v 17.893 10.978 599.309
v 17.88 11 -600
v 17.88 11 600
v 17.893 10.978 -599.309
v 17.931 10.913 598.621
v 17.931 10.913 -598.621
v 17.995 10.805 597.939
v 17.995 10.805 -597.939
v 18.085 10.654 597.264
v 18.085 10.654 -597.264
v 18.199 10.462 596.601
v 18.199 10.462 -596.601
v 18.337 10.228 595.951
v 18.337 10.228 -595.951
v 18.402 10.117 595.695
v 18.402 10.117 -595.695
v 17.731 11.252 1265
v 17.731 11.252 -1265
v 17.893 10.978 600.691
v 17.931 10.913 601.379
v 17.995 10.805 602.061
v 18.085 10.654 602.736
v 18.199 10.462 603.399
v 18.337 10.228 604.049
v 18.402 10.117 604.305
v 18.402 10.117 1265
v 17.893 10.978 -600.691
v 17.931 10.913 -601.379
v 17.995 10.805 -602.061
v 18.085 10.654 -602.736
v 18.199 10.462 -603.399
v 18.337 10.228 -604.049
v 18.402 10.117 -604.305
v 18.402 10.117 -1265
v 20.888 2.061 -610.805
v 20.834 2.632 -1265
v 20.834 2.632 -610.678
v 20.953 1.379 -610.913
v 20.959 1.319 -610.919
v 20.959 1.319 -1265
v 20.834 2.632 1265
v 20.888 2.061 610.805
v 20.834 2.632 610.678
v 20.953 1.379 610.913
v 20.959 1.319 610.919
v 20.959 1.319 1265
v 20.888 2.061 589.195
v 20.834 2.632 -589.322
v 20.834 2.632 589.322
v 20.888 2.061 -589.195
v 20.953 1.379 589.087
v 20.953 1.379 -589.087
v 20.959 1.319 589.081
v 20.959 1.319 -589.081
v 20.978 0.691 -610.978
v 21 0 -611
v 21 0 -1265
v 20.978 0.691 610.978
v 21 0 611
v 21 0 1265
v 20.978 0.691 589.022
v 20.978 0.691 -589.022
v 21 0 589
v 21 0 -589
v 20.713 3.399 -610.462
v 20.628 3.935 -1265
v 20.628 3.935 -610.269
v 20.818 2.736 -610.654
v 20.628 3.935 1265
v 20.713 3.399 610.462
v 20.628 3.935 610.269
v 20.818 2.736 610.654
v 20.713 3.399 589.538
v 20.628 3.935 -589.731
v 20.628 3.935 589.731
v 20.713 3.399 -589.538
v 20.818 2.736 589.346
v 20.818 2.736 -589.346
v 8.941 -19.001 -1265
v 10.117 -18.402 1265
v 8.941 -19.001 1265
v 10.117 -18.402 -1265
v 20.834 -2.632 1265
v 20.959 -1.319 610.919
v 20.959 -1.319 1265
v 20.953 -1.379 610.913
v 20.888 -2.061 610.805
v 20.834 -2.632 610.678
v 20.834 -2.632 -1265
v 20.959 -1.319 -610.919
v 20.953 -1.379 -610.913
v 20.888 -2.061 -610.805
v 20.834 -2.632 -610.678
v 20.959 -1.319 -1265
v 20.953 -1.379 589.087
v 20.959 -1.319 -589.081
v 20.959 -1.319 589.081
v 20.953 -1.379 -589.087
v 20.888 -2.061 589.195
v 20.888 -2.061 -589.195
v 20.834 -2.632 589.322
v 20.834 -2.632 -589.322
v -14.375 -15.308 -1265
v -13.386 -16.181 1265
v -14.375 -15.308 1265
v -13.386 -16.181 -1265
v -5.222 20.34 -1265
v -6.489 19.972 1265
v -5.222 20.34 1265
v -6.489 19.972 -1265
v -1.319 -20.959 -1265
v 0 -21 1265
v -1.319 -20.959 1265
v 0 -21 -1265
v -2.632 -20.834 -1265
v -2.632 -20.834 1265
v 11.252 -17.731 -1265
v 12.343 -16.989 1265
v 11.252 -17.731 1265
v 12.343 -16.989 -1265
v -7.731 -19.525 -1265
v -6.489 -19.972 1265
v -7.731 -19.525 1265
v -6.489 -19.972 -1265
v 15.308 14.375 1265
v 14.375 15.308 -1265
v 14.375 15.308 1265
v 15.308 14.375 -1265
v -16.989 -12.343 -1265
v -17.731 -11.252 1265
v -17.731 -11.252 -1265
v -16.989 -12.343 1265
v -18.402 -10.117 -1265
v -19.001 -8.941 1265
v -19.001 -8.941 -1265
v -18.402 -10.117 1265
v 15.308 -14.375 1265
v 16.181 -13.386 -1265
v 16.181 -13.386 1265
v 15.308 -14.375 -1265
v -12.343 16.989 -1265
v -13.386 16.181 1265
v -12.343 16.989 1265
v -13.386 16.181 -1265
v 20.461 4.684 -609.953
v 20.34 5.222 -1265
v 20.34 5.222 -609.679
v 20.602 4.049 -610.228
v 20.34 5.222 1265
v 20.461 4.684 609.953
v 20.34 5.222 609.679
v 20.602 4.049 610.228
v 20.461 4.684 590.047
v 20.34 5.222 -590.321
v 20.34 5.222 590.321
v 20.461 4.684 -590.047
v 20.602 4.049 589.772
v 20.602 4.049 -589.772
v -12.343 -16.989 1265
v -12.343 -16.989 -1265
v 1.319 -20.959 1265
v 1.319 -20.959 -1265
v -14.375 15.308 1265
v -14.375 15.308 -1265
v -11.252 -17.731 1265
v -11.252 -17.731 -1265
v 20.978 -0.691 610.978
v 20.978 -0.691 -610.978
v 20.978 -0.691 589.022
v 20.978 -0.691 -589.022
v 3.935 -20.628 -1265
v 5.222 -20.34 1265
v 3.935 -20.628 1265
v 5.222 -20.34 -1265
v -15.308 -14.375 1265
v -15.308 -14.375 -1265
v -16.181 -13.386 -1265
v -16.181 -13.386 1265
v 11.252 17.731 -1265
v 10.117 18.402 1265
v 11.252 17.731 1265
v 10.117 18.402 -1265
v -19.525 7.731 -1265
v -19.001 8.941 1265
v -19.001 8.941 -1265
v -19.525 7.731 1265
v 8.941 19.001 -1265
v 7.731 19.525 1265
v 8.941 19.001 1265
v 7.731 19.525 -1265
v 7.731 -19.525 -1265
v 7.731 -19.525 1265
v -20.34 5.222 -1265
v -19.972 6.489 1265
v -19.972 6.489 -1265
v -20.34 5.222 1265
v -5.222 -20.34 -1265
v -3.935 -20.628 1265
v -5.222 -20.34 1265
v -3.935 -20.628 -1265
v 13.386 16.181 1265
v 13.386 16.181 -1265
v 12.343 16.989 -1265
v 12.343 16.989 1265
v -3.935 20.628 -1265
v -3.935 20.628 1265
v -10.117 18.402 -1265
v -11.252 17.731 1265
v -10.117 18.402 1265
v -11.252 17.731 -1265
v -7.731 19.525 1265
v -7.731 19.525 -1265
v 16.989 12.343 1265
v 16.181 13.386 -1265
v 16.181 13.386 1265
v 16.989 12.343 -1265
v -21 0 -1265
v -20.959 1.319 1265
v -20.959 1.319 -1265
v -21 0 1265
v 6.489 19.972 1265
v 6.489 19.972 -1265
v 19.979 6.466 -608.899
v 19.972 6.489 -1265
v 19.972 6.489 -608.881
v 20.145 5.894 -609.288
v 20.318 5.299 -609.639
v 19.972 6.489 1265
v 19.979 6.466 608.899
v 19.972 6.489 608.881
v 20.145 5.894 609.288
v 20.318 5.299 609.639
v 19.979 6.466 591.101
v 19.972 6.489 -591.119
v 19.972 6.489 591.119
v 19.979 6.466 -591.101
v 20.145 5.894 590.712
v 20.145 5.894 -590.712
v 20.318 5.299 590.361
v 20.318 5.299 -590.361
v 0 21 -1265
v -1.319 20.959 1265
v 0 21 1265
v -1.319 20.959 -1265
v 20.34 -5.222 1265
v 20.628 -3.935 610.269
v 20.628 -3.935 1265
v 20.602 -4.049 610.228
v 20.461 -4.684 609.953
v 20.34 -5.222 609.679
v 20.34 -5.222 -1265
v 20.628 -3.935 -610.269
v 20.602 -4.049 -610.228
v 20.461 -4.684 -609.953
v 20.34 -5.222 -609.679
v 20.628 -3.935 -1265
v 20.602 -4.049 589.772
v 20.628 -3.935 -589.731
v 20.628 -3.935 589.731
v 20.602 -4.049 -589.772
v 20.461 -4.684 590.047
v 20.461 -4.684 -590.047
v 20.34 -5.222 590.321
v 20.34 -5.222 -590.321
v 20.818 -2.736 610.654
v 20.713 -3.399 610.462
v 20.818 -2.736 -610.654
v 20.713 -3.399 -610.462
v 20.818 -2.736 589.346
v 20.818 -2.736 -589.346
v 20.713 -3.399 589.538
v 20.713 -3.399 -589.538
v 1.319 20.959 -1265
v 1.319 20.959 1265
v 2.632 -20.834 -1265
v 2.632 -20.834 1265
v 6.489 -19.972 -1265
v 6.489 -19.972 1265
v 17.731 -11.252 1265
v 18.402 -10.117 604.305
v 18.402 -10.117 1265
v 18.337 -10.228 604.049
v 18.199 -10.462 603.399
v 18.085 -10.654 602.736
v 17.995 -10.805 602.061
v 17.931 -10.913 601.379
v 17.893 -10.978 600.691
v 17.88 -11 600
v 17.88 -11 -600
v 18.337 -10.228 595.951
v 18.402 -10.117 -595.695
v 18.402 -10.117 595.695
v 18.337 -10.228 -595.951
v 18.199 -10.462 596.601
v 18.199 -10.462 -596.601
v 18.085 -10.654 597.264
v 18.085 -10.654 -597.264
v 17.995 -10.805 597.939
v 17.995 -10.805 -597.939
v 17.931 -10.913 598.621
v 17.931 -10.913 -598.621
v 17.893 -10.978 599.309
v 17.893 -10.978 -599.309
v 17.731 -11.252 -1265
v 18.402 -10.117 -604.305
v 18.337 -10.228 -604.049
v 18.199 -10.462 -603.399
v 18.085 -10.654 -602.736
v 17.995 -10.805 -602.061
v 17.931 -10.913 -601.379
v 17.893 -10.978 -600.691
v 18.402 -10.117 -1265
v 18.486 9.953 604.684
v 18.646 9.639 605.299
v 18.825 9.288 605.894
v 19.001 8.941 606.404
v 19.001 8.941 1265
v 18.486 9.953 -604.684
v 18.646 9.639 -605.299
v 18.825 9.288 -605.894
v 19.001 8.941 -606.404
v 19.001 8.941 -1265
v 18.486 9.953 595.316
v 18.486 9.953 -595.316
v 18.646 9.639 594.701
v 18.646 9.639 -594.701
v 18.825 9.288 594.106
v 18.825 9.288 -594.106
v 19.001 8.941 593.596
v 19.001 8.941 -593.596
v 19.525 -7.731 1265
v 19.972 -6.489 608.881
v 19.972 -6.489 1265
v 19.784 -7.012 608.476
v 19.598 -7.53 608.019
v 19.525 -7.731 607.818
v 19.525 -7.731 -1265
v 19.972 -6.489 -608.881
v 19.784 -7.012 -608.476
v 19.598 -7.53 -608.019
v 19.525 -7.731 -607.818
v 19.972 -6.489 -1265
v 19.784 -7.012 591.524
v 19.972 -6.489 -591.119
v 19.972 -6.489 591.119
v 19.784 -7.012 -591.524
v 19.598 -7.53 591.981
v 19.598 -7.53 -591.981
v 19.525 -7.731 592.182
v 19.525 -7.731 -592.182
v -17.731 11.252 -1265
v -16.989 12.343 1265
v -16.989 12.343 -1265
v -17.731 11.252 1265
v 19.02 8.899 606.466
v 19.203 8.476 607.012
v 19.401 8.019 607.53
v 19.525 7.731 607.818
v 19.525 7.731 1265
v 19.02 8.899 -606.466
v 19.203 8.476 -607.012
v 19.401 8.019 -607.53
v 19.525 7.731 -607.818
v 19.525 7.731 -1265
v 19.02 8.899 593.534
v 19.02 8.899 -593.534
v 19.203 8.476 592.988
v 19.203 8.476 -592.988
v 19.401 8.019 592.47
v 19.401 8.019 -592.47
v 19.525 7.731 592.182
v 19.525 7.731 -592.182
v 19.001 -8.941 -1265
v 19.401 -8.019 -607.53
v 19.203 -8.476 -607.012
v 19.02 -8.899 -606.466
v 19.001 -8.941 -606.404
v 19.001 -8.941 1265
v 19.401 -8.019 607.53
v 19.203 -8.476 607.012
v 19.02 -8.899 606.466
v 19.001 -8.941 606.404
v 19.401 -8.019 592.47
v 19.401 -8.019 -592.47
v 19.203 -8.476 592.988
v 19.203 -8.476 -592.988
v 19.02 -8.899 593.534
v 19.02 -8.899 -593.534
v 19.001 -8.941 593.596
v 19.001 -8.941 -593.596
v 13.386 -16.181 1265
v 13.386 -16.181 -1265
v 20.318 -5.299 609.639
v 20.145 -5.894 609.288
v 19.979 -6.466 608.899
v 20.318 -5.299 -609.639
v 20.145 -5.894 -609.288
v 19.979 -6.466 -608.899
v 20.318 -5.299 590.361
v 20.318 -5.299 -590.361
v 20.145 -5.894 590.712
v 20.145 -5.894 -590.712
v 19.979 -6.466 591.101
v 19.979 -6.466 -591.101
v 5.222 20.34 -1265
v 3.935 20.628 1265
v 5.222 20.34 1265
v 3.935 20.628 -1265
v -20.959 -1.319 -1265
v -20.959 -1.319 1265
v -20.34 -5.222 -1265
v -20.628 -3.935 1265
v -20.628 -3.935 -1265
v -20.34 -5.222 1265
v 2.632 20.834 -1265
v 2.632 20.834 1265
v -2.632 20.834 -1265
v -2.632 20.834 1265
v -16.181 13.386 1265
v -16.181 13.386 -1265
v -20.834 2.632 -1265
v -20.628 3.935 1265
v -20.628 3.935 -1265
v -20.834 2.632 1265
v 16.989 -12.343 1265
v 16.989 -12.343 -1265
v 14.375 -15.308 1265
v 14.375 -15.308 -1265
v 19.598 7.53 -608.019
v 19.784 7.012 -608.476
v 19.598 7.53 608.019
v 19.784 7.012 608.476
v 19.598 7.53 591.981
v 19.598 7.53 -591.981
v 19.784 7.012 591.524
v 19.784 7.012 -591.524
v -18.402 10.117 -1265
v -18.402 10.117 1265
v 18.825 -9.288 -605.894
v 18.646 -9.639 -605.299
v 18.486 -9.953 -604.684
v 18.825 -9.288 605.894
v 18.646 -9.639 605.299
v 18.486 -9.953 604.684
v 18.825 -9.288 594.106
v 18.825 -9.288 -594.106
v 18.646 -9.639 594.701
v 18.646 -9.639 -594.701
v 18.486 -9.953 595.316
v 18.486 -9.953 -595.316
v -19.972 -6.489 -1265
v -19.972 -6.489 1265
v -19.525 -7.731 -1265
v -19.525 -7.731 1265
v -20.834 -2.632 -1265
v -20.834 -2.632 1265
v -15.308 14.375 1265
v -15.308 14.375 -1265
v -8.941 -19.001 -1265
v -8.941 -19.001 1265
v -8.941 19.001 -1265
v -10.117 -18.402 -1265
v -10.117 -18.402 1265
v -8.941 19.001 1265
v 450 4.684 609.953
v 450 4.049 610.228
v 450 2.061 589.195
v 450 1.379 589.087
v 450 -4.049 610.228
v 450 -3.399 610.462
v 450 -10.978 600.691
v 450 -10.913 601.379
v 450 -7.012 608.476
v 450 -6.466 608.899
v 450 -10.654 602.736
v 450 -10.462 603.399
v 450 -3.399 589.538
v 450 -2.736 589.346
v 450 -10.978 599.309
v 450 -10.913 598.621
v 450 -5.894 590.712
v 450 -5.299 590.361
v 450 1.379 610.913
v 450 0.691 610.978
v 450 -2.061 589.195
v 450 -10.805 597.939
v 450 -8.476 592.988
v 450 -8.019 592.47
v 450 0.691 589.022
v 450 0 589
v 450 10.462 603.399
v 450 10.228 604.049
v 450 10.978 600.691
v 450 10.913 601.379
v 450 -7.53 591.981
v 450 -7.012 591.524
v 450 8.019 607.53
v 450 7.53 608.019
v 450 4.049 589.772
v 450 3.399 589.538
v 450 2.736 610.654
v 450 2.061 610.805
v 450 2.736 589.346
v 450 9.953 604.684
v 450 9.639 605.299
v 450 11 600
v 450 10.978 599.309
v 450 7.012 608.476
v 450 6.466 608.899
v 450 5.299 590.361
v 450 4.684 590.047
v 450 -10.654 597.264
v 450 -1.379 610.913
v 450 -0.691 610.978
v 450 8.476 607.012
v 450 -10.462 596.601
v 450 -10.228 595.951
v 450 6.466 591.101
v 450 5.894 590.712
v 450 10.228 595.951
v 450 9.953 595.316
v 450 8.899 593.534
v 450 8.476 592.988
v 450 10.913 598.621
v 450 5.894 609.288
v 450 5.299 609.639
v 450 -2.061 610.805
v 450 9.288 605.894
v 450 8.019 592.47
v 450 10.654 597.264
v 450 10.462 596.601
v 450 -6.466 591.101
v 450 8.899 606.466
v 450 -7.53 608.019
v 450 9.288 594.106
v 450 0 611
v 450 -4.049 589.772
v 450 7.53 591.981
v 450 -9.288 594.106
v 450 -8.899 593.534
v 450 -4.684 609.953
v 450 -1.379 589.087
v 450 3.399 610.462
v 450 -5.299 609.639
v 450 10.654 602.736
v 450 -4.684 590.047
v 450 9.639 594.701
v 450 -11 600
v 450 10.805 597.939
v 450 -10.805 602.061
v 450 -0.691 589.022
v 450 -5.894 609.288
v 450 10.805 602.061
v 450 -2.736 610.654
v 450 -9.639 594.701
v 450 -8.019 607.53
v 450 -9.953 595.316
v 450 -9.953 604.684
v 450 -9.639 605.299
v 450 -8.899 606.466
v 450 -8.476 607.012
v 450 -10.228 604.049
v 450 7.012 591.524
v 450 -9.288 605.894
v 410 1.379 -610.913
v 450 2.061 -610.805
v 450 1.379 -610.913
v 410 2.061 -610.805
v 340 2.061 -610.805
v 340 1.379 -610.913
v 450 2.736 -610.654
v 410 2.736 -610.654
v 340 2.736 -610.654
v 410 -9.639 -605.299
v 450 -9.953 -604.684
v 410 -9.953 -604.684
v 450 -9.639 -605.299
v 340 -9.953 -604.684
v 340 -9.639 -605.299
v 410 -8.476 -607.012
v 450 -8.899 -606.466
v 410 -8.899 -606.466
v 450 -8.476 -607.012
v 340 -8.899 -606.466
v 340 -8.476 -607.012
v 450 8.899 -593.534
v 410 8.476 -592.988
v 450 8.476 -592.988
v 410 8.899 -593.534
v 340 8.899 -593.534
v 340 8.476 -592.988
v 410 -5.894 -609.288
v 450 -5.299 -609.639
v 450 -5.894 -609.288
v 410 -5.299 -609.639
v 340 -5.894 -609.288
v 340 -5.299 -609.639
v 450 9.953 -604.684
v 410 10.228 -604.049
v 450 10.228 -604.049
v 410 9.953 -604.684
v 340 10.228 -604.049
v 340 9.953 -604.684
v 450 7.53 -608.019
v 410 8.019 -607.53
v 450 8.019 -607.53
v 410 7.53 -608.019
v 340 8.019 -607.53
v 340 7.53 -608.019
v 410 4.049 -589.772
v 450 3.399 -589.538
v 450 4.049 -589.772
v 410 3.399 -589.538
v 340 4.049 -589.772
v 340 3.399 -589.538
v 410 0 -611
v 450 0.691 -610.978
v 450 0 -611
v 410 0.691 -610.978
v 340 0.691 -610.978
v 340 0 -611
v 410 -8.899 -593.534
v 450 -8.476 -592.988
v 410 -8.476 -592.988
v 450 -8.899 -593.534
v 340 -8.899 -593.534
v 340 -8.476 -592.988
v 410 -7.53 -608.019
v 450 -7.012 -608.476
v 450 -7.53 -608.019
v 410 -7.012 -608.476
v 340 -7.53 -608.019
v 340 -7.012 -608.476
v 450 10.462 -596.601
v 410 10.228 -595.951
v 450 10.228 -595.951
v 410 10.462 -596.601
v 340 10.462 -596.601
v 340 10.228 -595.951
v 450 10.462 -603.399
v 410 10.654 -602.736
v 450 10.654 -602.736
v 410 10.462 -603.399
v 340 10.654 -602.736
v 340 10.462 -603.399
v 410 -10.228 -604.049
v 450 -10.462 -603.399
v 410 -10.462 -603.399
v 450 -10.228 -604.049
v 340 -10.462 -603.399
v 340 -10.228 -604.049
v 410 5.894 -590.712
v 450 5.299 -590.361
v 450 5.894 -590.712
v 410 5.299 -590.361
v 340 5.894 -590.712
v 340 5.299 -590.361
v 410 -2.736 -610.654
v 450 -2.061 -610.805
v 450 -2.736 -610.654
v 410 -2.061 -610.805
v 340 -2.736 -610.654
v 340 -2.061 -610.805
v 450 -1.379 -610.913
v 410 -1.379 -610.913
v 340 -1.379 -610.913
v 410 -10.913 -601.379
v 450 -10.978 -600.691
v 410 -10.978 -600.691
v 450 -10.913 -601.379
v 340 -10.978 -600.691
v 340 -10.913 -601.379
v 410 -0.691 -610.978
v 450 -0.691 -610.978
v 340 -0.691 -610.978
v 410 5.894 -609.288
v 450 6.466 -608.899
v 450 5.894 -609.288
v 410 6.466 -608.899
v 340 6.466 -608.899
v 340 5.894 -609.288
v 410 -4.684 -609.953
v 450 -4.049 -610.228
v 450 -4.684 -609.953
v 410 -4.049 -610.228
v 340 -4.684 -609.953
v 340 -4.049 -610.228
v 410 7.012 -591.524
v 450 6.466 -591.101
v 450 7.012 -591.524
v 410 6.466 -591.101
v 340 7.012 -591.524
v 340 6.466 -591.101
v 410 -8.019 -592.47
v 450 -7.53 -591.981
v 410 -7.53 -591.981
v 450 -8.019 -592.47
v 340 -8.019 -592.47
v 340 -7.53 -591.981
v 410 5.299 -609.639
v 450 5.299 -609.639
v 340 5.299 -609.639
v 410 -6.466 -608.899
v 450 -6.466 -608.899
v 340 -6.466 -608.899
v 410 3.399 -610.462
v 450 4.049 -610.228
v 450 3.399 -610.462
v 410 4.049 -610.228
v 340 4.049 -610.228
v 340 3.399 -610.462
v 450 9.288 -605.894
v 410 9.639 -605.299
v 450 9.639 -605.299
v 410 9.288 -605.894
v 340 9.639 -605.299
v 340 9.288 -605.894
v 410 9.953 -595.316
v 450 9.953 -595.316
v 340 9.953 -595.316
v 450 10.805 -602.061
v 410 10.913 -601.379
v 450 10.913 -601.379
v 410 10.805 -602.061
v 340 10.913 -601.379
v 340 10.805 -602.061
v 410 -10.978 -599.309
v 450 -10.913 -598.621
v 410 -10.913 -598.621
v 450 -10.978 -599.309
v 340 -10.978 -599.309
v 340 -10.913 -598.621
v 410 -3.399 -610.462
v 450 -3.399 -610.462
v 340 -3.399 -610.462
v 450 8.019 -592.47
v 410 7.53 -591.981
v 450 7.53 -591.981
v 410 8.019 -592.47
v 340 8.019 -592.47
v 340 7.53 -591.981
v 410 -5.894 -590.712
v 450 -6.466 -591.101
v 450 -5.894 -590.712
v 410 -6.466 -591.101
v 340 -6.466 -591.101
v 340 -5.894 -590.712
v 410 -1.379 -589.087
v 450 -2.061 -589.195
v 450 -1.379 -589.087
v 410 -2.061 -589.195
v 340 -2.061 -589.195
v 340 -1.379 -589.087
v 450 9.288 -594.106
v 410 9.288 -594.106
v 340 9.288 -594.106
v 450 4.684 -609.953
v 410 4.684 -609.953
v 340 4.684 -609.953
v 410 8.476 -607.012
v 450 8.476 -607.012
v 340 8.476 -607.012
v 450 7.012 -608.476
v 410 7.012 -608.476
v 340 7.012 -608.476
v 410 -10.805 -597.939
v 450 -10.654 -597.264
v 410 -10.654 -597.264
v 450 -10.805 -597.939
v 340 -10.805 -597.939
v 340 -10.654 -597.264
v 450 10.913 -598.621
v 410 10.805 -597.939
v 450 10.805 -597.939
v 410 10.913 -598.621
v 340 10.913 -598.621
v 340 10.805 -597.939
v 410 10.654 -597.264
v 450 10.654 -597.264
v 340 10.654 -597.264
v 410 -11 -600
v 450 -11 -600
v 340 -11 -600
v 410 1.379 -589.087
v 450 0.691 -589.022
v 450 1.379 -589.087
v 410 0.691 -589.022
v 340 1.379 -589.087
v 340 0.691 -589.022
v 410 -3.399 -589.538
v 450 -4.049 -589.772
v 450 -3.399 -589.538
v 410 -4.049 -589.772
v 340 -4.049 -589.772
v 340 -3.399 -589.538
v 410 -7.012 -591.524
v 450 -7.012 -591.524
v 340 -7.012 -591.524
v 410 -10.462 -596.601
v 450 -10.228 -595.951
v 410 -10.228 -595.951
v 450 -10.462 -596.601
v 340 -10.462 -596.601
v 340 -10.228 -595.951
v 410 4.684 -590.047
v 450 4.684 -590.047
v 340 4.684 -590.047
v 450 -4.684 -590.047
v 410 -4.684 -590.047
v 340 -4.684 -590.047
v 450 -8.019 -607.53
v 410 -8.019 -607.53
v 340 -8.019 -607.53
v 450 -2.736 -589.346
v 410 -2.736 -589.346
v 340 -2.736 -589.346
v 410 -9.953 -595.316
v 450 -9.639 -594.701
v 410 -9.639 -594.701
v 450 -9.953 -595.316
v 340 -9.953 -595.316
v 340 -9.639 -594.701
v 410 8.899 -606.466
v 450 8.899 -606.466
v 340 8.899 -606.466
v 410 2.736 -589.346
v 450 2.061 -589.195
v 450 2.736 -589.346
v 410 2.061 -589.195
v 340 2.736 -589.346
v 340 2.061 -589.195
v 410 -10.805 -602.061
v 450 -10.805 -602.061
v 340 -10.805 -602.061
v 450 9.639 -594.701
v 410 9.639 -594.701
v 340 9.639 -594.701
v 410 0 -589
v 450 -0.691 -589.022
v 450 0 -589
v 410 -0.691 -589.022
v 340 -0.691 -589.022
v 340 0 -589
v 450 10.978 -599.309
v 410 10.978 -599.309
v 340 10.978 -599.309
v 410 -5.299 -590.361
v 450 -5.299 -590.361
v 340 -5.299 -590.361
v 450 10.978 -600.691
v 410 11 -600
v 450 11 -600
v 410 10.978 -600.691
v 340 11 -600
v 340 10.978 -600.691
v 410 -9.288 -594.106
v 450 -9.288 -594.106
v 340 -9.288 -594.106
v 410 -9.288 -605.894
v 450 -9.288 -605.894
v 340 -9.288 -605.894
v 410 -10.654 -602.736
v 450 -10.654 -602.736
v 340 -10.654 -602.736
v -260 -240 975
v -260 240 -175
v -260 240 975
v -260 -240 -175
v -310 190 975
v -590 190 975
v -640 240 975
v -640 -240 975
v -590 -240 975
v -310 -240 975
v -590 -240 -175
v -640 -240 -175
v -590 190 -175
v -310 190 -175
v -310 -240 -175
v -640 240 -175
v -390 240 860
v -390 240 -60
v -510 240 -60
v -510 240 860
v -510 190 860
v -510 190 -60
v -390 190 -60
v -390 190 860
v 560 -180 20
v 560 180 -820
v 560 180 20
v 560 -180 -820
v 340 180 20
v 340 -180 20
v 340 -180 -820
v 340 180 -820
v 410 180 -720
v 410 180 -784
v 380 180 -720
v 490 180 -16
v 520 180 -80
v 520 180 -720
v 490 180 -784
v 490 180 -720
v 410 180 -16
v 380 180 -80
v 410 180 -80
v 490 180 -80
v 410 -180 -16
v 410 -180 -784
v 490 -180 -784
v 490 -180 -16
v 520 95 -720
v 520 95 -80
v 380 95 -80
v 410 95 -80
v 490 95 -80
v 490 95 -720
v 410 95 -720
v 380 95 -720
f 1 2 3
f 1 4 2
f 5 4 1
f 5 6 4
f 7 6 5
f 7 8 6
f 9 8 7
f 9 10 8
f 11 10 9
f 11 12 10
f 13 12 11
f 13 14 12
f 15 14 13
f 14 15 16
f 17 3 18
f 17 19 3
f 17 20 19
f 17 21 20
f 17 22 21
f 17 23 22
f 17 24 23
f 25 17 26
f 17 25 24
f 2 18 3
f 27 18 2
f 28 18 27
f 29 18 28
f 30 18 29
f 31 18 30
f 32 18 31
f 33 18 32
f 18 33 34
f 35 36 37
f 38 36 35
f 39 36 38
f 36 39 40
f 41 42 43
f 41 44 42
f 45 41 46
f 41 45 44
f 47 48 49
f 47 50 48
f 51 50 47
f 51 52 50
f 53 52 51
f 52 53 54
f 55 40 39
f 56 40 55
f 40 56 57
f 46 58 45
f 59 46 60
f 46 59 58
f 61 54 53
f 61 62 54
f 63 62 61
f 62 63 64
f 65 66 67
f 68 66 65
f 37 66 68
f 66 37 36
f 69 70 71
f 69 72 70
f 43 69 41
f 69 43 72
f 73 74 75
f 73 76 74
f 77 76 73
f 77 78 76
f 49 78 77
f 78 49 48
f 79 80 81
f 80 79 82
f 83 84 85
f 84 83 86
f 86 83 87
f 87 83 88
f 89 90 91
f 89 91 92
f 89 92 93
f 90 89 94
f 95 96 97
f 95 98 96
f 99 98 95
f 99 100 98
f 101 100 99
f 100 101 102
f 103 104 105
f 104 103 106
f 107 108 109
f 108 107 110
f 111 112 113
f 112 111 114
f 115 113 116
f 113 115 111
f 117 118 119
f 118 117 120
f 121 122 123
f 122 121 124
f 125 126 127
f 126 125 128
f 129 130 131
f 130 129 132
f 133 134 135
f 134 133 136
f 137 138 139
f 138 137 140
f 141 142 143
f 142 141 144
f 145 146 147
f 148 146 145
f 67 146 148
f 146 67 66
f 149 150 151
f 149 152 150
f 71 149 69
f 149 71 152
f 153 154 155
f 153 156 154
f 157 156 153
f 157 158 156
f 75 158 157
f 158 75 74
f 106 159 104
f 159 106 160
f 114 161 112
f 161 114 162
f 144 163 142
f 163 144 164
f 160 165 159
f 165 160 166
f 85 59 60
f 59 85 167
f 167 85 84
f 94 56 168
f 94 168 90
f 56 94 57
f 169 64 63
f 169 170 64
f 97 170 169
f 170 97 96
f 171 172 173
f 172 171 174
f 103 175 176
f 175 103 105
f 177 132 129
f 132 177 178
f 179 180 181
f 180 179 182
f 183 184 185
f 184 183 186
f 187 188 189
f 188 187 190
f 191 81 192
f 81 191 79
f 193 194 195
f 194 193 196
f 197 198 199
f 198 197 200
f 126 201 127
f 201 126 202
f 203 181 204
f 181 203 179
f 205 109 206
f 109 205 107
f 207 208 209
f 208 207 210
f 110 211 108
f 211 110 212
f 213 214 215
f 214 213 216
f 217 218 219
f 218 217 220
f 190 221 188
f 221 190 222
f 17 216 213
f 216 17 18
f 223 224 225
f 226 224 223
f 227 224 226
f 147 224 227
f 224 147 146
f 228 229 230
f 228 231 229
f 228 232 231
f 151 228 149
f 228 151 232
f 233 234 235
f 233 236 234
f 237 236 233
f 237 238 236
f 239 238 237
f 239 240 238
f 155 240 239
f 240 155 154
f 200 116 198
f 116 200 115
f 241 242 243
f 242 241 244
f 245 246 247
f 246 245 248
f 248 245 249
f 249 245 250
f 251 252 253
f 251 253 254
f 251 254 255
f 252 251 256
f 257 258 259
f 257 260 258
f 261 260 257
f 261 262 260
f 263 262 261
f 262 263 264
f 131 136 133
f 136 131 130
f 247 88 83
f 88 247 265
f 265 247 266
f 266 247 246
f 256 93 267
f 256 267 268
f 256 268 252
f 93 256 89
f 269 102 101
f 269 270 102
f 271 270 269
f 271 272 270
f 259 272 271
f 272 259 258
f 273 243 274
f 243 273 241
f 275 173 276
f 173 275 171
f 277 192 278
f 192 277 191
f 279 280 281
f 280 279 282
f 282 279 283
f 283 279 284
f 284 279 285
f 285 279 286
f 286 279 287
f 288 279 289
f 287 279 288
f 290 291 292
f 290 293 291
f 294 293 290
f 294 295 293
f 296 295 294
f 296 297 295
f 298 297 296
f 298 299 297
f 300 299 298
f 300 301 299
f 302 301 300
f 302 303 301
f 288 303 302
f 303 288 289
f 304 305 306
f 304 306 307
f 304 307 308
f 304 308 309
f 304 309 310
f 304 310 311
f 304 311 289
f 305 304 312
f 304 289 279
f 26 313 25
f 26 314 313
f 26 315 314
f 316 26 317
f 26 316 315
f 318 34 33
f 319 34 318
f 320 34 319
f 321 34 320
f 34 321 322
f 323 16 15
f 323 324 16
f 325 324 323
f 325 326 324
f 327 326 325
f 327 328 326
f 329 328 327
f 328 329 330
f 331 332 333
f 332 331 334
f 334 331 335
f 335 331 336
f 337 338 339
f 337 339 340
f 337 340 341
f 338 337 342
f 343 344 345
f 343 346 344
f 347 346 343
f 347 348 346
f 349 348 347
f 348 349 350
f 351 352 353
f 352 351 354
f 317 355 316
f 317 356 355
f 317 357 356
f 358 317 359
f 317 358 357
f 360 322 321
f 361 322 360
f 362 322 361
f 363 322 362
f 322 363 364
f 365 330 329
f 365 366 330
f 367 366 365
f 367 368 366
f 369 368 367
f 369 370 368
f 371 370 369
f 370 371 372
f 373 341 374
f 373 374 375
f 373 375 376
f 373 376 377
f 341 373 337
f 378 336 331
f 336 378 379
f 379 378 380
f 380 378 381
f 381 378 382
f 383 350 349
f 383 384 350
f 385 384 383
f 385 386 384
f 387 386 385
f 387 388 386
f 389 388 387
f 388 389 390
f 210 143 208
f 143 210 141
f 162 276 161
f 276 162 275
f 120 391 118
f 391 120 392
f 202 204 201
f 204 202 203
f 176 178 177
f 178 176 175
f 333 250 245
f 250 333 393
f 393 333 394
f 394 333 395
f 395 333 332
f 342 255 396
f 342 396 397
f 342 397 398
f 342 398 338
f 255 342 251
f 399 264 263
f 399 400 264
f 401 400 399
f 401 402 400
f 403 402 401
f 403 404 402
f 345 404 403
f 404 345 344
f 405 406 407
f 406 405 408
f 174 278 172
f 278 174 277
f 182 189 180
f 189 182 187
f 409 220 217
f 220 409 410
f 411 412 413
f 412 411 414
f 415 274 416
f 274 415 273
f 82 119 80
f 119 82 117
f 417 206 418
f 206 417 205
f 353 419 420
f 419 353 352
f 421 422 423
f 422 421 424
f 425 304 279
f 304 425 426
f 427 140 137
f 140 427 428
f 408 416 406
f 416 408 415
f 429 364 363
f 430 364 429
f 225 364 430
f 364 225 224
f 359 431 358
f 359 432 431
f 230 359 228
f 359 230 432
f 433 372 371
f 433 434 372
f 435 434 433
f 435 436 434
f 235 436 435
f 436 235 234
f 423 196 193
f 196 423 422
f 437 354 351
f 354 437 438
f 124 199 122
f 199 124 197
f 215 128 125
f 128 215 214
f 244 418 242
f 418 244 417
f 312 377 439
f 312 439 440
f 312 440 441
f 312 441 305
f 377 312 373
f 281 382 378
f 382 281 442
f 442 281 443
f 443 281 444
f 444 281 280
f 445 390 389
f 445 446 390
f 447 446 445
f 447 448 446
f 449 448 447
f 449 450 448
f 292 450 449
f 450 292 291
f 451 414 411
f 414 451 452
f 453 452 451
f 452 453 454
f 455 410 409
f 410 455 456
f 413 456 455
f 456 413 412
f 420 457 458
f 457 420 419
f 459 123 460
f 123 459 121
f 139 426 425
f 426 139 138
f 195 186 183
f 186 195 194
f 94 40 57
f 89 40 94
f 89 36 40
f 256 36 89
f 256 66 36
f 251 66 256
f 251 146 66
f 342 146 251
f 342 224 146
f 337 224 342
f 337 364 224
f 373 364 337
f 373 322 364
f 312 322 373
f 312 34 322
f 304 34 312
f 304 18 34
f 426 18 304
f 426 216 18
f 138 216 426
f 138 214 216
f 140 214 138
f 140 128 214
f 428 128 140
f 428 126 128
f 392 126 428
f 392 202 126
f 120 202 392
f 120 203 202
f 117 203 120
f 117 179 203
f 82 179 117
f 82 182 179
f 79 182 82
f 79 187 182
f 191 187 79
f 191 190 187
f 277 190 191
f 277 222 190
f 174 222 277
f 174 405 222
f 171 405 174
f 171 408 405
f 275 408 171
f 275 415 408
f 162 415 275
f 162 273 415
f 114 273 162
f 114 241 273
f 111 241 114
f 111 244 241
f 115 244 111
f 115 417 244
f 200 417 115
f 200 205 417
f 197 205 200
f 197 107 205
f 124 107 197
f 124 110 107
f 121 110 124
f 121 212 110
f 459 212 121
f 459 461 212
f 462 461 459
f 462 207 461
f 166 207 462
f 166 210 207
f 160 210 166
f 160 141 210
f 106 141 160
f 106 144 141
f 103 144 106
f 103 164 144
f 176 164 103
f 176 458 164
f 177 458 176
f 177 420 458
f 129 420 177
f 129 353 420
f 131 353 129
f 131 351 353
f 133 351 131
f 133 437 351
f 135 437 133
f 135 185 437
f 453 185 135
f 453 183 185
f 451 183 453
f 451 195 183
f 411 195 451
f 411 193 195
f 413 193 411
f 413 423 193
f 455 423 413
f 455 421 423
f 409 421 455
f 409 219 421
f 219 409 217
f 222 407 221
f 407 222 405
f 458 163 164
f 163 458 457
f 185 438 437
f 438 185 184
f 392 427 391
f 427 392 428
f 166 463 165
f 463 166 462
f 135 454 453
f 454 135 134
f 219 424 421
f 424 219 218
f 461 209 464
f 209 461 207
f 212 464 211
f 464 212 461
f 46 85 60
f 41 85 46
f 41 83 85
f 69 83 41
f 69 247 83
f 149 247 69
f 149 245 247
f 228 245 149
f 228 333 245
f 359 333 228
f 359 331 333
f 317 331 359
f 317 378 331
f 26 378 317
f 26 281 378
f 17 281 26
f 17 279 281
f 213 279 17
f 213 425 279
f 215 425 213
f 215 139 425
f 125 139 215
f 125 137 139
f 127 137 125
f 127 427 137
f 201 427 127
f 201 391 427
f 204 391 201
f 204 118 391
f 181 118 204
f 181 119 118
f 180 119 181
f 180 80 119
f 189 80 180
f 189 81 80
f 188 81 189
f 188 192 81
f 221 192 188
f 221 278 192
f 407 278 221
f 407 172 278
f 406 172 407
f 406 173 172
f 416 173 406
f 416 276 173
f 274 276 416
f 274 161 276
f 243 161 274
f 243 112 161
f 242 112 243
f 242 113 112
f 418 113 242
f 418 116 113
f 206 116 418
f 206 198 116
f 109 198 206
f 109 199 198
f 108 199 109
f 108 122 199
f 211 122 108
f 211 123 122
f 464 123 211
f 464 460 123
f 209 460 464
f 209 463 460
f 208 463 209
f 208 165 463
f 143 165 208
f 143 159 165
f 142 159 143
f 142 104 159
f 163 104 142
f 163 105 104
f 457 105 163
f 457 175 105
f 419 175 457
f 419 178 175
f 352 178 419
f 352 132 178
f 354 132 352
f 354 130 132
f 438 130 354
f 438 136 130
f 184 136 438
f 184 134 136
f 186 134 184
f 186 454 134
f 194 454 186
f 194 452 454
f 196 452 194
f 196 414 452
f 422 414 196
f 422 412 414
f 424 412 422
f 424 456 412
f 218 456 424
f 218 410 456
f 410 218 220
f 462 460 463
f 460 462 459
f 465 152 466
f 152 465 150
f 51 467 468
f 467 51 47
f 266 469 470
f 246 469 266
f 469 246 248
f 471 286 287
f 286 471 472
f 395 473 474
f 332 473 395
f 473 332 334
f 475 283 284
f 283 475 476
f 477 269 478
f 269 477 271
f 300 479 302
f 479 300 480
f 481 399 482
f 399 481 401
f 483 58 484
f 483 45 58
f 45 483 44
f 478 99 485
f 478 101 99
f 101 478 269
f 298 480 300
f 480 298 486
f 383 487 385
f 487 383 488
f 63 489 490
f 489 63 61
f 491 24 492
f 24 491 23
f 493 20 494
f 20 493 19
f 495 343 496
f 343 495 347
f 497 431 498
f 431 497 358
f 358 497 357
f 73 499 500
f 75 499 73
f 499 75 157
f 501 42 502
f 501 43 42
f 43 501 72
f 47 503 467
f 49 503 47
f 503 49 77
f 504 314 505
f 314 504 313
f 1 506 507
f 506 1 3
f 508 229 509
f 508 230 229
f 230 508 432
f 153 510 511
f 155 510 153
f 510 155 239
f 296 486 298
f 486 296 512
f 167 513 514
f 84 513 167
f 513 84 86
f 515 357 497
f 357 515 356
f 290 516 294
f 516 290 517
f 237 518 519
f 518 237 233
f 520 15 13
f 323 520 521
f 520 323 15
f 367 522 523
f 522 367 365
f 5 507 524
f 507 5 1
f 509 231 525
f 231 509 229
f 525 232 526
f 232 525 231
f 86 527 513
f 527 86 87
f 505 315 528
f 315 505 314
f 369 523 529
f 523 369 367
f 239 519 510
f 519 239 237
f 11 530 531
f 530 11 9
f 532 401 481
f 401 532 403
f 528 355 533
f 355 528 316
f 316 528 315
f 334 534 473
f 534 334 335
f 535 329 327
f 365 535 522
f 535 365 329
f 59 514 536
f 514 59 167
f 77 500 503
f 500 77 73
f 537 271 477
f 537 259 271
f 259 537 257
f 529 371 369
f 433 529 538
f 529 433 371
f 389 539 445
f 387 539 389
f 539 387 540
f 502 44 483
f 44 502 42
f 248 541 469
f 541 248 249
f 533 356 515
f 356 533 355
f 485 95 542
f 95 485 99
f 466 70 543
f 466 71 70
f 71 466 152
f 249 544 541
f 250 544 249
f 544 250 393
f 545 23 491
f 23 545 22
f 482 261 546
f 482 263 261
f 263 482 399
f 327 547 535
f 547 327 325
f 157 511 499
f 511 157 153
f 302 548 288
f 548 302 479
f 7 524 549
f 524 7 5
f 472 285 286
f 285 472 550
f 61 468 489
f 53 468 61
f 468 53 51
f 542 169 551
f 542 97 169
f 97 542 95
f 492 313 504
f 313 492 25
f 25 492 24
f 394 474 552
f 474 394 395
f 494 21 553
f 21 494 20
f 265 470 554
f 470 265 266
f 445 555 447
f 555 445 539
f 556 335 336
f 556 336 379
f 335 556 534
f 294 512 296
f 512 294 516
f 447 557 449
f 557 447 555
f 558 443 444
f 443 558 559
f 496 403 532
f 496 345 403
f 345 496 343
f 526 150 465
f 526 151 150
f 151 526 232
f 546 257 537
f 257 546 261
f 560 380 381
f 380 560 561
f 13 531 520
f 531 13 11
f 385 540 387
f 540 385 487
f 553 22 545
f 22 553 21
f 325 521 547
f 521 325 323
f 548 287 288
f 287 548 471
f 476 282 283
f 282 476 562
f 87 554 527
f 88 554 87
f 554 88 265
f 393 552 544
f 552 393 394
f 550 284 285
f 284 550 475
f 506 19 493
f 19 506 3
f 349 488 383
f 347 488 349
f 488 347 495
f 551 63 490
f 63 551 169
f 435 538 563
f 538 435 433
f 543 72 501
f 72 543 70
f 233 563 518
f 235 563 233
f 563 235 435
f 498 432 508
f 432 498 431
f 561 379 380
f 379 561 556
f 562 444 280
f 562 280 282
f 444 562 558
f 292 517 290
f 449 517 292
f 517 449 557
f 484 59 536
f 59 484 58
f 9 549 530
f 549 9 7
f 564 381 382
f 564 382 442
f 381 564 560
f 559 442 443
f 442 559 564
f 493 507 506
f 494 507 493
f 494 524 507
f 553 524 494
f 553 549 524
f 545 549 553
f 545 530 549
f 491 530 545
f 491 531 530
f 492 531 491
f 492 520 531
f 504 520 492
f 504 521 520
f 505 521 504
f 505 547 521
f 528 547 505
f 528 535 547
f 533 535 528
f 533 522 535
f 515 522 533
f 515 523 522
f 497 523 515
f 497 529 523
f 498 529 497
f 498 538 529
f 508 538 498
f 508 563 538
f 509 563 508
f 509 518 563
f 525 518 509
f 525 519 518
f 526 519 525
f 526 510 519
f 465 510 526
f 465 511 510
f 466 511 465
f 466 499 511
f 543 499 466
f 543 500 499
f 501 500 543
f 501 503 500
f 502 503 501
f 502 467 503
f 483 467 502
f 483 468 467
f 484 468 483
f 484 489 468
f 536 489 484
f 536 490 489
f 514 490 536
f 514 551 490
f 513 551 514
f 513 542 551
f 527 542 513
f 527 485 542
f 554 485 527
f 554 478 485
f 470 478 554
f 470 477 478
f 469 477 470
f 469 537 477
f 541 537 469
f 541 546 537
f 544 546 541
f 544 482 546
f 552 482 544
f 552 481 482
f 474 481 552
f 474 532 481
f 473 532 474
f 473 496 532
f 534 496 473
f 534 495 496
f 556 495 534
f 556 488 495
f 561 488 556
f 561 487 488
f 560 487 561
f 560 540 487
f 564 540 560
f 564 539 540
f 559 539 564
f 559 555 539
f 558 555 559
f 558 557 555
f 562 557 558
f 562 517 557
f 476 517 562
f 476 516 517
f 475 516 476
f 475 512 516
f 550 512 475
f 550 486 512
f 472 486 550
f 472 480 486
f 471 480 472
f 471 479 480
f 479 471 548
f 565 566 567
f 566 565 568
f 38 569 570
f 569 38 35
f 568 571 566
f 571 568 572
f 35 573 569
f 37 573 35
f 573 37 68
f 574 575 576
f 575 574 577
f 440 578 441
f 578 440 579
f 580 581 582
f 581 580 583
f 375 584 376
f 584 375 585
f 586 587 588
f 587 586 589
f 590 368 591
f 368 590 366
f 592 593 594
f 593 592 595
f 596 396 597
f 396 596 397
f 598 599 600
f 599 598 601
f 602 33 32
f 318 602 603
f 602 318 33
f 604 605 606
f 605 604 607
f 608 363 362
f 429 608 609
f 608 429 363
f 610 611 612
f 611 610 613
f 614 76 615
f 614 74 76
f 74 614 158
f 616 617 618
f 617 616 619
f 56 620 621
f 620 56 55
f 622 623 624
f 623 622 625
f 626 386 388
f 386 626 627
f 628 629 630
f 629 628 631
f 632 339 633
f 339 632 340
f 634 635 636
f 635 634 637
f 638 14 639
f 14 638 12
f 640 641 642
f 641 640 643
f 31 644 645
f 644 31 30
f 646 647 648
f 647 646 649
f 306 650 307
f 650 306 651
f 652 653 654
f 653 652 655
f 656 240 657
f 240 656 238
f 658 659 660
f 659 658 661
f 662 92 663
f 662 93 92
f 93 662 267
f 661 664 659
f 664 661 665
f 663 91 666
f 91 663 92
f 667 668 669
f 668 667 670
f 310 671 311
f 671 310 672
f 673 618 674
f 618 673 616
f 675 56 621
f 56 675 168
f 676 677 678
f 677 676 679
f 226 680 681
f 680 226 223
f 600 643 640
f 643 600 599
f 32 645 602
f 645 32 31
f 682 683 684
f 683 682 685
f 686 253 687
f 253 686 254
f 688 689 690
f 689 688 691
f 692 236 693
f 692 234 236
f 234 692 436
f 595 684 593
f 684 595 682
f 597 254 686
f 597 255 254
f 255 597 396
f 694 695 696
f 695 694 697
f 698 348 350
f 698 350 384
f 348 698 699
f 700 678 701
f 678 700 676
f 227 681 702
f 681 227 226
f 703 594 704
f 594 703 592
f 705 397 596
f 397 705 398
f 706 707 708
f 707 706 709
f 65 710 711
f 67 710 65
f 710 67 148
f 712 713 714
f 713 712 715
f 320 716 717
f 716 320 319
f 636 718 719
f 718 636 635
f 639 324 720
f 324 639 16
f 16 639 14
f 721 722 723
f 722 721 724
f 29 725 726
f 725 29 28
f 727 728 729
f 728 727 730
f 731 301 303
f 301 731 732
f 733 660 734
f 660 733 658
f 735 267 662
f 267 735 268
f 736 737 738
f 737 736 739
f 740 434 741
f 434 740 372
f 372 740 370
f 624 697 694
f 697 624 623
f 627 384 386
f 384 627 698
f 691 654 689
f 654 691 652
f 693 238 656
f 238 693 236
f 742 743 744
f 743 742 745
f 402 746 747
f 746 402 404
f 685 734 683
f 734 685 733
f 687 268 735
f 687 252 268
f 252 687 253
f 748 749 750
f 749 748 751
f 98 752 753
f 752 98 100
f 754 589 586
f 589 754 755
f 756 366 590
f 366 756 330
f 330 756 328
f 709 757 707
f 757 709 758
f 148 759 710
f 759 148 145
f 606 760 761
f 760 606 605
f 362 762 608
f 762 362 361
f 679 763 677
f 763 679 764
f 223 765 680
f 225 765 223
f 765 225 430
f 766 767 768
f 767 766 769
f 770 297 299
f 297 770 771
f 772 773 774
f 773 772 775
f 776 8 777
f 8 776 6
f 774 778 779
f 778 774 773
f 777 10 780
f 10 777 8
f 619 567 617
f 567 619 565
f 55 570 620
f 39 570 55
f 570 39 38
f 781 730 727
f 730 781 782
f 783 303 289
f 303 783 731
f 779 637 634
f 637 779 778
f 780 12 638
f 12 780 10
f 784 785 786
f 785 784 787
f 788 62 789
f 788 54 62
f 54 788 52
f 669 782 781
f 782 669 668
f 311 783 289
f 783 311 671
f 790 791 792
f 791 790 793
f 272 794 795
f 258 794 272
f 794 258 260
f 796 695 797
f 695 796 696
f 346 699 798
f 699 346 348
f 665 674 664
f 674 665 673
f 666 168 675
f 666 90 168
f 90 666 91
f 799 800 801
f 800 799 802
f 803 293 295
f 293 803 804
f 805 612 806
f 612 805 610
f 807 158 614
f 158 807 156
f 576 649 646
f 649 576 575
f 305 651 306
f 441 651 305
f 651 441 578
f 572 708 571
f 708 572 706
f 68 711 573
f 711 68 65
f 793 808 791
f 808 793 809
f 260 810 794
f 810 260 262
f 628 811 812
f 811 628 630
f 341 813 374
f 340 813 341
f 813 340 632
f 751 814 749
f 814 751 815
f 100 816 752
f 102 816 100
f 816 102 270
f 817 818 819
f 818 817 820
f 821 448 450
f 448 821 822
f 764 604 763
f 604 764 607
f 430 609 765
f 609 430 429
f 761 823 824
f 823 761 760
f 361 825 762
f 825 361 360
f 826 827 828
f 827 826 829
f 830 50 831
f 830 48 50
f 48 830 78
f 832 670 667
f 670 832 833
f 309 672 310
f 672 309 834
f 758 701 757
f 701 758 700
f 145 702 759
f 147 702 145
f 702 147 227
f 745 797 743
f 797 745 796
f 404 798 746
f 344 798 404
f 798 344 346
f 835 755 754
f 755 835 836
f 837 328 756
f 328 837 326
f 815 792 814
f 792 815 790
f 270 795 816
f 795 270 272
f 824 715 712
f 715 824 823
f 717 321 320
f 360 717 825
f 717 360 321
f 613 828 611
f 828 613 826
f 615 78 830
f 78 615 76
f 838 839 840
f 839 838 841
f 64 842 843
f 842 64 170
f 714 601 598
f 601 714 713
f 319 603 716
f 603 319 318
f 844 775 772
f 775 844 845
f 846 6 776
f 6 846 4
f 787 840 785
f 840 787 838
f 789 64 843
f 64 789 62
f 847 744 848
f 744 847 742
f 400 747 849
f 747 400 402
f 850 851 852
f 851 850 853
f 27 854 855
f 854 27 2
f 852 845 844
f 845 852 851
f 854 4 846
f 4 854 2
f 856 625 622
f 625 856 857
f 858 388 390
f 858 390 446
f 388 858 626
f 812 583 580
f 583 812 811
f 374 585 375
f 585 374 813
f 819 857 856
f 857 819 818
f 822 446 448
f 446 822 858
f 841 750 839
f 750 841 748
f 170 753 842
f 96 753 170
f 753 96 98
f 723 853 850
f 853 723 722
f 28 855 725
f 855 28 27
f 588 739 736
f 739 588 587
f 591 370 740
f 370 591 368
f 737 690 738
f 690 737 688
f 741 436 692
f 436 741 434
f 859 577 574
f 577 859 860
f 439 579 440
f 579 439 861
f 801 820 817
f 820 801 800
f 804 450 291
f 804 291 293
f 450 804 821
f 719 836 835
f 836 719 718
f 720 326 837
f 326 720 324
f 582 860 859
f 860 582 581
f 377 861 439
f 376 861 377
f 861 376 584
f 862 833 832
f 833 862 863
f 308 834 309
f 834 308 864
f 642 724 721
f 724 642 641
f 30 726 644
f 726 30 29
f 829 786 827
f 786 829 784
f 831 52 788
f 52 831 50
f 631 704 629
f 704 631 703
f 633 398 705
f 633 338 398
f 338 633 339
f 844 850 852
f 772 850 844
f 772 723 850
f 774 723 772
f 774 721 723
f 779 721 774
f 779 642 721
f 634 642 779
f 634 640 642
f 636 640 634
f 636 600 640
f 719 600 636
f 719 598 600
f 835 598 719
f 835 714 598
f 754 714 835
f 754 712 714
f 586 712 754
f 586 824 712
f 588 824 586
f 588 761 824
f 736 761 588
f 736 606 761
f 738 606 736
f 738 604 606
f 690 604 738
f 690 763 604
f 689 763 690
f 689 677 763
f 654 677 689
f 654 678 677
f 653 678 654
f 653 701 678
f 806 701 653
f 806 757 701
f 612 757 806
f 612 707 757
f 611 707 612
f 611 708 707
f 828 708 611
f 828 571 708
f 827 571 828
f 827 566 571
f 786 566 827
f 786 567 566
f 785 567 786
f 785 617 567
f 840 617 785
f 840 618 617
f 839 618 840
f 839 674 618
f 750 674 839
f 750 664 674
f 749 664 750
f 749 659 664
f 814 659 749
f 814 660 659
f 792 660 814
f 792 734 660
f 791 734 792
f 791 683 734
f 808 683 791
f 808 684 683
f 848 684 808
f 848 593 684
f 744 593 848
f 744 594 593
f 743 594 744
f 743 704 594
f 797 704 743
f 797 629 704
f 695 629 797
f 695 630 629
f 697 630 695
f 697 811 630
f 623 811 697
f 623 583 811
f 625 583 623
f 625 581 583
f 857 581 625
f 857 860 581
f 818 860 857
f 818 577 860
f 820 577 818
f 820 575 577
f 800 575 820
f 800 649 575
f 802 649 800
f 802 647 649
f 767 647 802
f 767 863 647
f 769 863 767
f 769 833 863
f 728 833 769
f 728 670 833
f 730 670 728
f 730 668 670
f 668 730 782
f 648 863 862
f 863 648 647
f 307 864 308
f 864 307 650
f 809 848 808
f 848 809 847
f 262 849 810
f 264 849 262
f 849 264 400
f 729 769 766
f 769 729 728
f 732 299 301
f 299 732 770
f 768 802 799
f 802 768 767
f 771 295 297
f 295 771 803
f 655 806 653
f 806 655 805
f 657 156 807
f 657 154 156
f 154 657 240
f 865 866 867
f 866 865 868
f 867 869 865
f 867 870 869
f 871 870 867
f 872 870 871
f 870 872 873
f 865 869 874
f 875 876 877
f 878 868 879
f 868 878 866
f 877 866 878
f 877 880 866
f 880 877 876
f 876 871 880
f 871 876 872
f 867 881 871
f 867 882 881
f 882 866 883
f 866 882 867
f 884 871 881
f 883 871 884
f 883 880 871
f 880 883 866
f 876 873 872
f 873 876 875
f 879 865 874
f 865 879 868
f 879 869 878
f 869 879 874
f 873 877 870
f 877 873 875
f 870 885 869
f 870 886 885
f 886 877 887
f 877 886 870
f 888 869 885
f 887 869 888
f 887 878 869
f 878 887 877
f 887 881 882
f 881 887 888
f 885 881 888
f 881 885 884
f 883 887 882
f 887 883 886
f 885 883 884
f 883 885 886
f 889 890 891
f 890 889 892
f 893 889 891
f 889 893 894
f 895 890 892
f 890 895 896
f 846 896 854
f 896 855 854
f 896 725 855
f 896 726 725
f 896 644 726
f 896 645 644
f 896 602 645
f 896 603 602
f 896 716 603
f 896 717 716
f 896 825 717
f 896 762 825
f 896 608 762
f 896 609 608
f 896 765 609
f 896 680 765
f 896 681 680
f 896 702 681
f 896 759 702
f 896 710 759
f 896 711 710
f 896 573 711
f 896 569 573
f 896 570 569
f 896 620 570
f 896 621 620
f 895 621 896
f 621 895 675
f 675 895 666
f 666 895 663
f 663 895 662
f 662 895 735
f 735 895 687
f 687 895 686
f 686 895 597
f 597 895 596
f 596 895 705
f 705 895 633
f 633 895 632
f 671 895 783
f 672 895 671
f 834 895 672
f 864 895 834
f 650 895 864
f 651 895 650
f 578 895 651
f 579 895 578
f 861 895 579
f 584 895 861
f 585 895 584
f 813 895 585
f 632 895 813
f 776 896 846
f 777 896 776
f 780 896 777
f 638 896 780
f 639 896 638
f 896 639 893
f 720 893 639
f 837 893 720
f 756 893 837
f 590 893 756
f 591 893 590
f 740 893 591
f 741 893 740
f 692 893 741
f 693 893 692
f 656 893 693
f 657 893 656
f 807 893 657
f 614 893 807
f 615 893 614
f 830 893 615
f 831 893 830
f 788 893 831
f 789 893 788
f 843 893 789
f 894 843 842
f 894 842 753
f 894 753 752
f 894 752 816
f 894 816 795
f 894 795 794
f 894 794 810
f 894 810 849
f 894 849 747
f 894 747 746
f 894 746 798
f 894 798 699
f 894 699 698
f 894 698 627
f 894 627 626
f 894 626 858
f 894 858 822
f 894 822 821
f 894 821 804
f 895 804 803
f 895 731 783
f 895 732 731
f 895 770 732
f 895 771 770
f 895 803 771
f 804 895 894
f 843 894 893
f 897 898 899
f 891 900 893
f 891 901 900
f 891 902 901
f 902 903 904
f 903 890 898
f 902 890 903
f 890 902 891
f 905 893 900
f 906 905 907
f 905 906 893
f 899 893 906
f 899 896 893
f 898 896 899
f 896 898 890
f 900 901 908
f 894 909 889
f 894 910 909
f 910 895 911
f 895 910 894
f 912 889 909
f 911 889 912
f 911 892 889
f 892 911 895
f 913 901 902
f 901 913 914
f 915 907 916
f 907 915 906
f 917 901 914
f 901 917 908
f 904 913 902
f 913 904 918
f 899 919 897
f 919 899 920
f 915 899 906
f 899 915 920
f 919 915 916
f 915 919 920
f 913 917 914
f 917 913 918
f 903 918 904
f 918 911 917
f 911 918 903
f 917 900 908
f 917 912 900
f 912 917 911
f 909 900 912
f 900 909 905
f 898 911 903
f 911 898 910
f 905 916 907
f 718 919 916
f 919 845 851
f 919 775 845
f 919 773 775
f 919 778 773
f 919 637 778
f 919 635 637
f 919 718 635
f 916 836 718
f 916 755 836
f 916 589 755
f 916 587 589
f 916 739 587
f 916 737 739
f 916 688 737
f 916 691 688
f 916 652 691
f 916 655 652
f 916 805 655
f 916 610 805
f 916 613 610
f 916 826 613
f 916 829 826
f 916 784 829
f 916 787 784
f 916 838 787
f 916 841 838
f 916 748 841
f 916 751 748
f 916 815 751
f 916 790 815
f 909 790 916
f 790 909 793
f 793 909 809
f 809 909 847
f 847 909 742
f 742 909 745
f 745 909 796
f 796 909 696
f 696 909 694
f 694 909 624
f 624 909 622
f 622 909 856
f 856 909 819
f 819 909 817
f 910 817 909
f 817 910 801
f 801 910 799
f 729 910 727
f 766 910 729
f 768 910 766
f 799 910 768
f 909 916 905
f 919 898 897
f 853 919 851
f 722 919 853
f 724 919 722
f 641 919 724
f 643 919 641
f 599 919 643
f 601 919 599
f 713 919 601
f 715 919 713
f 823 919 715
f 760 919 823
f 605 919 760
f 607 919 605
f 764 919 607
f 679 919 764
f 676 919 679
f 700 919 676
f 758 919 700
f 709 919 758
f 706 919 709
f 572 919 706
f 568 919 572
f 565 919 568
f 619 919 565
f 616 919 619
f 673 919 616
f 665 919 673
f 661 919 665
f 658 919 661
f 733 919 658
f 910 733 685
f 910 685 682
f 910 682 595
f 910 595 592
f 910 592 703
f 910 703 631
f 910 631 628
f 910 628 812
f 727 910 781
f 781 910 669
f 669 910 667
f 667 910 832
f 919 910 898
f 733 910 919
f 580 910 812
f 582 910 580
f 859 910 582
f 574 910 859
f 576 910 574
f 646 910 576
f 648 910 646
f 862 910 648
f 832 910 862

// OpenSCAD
// ============================================================================
// PROJECT: XXXG-00W0 WING GUNDAM ZERO EW - WEAPON REBALANCING MATRIX
// COMPONENT VAULT: BANDAI CAST RUNNER D - RIFLE STOCK GUARDS D3 & D4
// INGESTION COMPATIBILITY: FOREARM LOCK COUPLING AND POWER RAIL MATING
// DESIGN RULE: SCALED TITANIUM CASTS (1:1 ACTUAL METRIC UP-SCALE FOR 16.7M MECHA)
// ============================================================================

$fn = 100; // Circular segment resolution calculation count

// Sizing Variables Scaled 1:1 for a 16.7-Meter Airframe Scale (mm)
stock_guard_length = 1150;              // Total vertical height of stock block (mm)
interface_track_stroke = 640;           // Longitudinal sliding track travel path (mm)
power_rail_contact_width = 120;         // Sub-surface 4oz copper interface path (mm)
titanium_armor_wall = 50;               // Zoned TiAl protective outer casing (mm)

module Runner_D_Stock_Forge() {
    // Central Supply Injection Runner Axis (Molten Feed Line from Siphon Forge)
    color([0.24, 0.24, 0.26]) {
        cylinder(h = stock_guard_length * 2.2, d = 42, center = true);
        // Direct injection gates tracking straight into the part mold cavities
        translate([0, 0, 600]) rotate([0, 90, 0]) cylinder(h = 450, d = 22);
        translate([0, 0, -600]) rotate([0, 90, 0]) cylinder(h = 450, d = 22);
    }
    
    // Instantiate Scaled Part Molds Symmetrically (Left & Right Weapon Blips)
    Cast_Rifle_Mating_Components();
}

module Cast_Rifle_Mating_Components() {
    // ---- PART D3: TWIN BUSTER RIFLE STOCK SHIELD COWLING ---- [Page 8, Step 10]
    translate([-450, 0, 400]) color([0.5, 0.5, 0.55]) {
        difference() {
            // Main solid shock-absorbing rear shield block
            cube([380, 480, stock_guard_length], center = true);
            
            // Internal pocket clearance to fit around the inner receiver block
            translate([0, -titanium_armor_wall, 0])
                cube([380 - (titanium_armor_wall*2), 480, stock_guard_length + 10], center = true);
                
            // Continuous cast-in contact pad slots for the 4oz power bus links
            cube([power_rail_contact_width, 600, stock_guard_length * 0.8], center = true);
        }
    }
    
    // ---- PART D4: FOREARM LOCKING INTERFACE SLIDING TRACK ---- [Page 8, Step 10]
    translate([450, 0, -400]) color([0.3, 0.3, 0.35]) {
        difference() {
            // Rigid interface block that slots straight into J14 couplers
            cube([220, 360, interface_track_stroke + 200], center = true);
            
            // Precision T-slot guide track cutout to ensure absolute lock-up alignment
            translate([0, (360/2 - 40), 0])
                cube([140, 90, interface_track_stroke], center = true);
                
            // Sub-surface conduit track routing the telemetric logic links
            cube([power_rail_contact_width - 40, 400, interface_track_stroke * 1.2], center = true);
        }
    }
}

// Render Master Assembly to Parameter Workspace
Runner_D_Stock_Forge();
